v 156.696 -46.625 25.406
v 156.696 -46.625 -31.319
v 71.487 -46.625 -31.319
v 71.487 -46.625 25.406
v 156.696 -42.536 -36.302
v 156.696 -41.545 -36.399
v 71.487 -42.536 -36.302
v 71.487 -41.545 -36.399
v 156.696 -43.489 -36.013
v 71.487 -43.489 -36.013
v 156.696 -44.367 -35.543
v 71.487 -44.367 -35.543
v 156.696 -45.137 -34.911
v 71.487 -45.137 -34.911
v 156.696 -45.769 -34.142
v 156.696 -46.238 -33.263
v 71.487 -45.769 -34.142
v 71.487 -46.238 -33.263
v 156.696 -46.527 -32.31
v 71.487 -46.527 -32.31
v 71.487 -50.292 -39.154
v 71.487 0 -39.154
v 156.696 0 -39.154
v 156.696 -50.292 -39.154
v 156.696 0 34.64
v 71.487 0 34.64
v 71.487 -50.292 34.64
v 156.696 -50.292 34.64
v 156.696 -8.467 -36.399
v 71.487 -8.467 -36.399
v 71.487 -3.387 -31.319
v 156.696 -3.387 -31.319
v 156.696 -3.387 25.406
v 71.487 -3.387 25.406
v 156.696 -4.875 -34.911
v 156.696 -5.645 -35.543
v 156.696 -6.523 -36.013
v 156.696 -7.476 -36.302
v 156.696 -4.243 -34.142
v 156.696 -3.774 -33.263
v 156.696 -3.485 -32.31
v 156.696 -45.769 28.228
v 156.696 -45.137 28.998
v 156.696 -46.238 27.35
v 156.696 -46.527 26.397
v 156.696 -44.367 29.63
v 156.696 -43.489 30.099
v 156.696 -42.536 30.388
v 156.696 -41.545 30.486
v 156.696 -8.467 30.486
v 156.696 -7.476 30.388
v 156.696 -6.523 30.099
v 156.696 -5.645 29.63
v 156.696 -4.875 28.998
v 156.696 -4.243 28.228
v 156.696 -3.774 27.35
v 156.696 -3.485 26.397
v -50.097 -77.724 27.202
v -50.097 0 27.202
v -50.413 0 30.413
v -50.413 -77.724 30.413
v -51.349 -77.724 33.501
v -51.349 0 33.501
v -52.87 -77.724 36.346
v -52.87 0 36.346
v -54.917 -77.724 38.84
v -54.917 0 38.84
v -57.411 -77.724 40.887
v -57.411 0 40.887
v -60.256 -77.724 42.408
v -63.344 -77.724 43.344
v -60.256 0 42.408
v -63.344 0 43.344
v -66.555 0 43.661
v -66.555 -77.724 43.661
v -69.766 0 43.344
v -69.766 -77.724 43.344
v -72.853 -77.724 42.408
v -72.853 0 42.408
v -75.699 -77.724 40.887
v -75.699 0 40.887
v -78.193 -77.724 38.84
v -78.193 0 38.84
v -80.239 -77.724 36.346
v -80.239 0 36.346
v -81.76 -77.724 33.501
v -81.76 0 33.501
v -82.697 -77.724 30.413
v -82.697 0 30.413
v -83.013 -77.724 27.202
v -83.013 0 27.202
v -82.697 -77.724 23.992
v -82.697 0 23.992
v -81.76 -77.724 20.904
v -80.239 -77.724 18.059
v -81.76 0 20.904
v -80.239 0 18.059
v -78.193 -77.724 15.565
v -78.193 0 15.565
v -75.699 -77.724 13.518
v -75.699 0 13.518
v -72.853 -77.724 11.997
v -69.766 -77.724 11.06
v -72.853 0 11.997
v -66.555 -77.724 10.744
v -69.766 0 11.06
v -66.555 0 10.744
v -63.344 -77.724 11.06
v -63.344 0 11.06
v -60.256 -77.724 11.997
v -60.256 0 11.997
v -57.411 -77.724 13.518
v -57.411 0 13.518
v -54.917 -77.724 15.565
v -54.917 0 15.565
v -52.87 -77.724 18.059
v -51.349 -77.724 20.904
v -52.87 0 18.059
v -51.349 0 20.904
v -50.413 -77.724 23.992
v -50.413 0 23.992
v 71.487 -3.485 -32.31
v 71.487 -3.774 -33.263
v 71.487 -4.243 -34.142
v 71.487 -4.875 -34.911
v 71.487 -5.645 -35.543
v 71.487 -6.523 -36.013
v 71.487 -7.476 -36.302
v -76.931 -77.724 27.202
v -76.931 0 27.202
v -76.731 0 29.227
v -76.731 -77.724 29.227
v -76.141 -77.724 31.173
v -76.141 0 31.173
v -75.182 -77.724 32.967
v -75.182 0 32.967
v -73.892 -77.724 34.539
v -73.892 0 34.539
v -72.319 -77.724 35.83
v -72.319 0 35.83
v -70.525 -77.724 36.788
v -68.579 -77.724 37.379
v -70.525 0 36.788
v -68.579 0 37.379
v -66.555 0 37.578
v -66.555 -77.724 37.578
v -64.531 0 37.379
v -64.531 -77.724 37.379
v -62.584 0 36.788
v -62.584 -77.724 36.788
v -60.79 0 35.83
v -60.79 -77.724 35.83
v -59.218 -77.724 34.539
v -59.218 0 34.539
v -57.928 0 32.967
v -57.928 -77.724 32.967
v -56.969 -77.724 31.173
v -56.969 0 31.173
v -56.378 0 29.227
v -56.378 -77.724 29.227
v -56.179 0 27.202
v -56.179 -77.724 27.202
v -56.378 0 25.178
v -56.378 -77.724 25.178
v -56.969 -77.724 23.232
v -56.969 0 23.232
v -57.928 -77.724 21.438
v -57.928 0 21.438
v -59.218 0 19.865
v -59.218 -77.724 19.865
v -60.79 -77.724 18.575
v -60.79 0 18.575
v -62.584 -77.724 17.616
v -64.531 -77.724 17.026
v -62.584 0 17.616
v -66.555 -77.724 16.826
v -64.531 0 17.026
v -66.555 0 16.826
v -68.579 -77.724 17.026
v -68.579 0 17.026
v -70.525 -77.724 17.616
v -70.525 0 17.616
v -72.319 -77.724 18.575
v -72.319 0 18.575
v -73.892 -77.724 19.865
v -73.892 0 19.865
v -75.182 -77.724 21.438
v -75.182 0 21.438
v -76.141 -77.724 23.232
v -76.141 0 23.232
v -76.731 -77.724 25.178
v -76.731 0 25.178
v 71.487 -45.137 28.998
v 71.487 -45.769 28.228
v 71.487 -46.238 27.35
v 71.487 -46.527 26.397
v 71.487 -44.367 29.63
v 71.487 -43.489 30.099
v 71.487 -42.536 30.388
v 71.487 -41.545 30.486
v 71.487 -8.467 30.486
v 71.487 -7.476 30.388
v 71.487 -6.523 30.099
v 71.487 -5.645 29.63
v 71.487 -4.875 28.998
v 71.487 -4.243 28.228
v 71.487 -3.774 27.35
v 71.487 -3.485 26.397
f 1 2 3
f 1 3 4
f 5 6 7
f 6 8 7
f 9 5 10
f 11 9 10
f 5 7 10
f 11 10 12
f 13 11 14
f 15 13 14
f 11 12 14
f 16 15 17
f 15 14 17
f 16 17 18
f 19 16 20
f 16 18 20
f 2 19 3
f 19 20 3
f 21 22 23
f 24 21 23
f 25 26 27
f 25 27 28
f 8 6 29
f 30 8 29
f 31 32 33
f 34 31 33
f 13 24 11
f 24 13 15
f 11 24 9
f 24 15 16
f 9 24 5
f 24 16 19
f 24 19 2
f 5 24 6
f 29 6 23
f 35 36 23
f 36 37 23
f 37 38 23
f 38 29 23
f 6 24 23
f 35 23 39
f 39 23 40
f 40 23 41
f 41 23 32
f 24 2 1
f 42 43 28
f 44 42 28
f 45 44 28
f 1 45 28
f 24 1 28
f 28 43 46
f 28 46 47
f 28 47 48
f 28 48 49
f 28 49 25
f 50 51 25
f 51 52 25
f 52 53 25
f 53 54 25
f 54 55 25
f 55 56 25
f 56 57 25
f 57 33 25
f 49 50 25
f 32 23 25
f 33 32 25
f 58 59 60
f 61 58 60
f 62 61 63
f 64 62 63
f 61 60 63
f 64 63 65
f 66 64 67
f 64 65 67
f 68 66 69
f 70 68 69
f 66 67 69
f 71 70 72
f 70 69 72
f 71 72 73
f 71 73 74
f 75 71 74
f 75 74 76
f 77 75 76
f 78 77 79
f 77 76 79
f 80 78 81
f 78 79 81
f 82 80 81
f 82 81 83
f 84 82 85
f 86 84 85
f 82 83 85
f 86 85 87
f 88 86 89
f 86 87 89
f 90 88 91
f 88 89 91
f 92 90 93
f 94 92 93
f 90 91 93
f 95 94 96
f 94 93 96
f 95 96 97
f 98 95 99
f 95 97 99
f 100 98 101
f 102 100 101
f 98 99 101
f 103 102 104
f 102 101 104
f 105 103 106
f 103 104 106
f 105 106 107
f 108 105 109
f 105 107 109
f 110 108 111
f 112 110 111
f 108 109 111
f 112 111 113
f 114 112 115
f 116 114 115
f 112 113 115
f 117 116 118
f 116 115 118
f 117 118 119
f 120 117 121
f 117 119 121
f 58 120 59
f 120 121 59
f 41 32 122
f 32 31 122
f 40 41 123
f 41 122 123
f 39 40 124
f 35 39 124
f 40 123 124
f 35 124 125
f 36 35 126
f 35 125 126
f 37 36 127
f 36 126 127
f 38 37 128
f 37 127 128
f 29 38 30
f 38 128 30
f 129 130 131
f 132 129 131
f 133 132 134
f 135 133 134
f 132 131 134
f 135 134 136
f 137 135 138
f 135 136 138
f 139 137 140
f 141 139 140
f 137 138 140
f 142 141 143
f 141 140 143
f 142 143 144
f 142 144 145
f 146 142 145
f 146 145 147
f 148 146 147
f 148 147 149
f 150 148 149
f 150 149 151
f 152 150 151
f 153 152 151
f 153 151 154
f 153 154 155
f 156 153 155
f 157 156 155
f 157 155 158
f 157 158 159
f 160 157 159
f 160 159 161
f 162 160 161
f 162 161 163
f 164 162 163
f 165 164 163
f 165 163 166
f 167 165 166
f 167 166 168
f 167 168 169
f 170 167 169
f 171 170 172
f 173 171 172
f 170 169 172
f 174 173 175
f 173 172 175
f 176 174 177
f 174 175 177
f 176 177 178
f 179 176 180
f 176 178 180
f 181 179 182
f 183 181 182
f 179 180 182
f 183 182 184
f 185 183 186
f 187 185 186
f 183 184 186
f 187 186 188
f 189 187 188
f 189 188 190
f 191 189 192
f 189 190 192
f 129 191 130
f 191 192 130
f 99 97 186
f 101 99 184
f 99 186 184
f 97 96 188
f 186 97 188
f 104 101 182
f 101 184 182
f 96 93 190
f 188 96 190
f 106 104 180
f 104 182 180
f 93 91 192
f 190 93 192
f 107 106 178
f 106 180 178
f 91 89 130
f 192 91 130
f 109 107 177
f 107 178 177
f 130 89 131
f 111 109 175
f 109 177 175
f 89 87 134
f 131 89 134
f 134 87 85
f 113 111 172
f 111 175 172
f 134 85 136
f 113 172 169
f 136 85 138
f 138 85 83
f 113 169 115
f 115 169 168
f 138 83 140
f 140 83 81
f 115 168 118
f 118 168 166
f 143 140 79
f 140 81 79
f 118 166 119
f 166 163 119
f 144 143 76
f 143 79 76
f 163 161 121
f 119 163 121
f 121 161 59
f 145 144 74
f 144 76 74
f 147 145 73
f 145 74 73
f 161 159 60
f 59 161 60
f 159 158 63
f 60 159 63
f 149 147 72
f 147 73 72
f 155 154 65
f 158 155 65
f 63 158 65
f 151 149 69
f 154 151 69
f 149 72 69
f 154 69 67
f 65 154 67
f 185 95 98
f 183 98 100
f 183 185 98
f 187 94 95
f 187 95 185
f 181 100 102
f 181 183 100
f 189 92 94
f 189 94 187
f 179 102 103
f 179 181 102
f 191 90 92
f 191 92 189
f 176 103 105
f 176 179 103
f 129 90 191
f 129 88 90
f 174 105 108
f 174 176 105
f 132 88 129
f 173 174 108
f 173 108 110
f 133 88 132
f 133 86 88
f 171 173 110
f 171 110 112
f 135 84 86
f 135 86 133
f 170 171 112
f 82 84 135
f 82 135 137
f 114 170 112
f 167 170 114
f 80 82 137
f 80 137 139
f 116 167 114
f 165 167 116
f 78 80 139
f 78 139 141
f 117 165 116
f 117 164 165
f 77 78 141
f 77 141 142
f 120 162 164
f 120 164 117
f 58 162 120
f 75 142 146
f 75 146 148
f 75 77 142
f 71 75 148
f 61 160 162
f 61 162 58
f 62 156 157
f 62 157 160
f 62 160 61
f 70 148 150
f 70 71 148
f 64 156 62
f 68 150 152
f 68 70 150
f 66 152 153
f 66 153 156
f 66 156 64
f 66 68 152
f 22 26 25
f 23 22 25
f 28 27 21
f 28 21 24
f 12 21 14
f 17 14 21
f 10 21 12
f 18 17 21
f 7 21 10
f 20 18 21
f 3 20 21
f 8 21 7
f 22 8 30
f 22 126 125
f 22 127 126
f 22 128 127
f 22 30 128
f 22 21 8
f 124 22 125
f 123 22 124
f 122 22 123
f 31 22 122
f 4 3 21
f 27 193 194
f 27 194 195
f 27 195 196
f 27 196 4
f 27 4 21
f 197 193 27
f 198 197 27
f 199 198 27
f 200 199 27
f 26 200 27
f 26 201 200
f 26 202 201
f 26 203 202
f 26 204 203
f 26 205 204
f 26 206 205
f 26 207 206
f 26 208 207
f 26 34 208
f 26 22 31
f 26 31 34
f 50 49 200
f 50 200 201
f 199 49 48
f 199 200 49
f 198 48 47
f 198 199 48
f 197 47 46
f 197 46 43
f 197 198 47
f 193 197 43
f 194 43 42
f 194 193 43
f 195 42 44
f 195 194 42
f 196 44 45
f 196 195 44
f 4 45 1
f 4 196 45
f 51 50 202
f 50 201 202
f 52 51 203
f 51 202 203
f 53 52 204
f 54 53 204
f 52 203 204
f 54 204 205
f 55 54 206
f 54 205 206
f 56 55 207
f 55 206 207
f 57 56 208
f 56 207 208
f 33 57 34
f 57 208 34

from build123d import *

# Parameters (mm, degrees)
F0_R     = 16.4582820338
F0_R_2   = 10.3759
F1_DEPTH = 77.724
F2_R     = 10.3759
F3_DEPTH = 121.158
F4_W     = 85.2083563805
F4_H     = 73.7946406007
F5_DEPTH = 50.292
F6_W     = 43.2375106029
F6_H     = 66.885214299
F7_DEPTH = 214.122
F8_R     = 5.08


with BuildPart() as f1:
    # F0 (on Front) → F1 (new body)
    with BuildSketch(Plane.XZ):
        with Locations((-66.5547922254, 27.202360332)):
            Circle(F0_R)
        with Locations((-66.5547922254, 27.202360332)):
            Circle(F0_R_2, mode=Mode.SUBTRACT)
        with Locations((-66.5547922254, 27.202360332)):
            Circle(F0_R_2)
    extrude(amount=F1_DEPTH)

    # F2 (on face) → F3 (cut)
    with BuildSketch(Plane(origin=(0, 0, 0), x_dir=(-1, 0, 0), z_dir=(0, 1, 0))):
        with Locations((66.5547922254, 27.202360332)):
            Circle(F2_R)
    extrude(amount=-F3_DEPTH, mode=Mode.SUBTRACT)


with BuildPart() as f5:
    # F4 (on Front) → F5 (new body)
    with BuildSketch(Plane.XZ):
        with Locations((114.0915453434, -2.257052809)):
            Rectangle(F4_W, F4_H)
    extrude(amount=F5_DEPTH)

    # F6 (on face) → F7 (cut)
    with BuildSketch(Plane.YZ.offset(156.6957235336)):
        with Locations((-25.0060728285, -2.9566902667)):
            Rectangle(F6_W, F6_H)
    extrude(amount=-F7_DEPTH, mode=Mode.SUBTRACT)

    # F8
    f8_edges = [f5.edges().sort_by_distance(p)[0] for p in [
        (114.091545, -3.387318, 30.485917),
        (114.091545, -46.624828, 30.485917),
        (114.091545, -46.624828, -36.399297),
        (114.091545, -3.387318, -36.399297),
    ]]
    fillet(f8_edges, radius=F8_R)


solid = Compound([f1.part, f5.part])
